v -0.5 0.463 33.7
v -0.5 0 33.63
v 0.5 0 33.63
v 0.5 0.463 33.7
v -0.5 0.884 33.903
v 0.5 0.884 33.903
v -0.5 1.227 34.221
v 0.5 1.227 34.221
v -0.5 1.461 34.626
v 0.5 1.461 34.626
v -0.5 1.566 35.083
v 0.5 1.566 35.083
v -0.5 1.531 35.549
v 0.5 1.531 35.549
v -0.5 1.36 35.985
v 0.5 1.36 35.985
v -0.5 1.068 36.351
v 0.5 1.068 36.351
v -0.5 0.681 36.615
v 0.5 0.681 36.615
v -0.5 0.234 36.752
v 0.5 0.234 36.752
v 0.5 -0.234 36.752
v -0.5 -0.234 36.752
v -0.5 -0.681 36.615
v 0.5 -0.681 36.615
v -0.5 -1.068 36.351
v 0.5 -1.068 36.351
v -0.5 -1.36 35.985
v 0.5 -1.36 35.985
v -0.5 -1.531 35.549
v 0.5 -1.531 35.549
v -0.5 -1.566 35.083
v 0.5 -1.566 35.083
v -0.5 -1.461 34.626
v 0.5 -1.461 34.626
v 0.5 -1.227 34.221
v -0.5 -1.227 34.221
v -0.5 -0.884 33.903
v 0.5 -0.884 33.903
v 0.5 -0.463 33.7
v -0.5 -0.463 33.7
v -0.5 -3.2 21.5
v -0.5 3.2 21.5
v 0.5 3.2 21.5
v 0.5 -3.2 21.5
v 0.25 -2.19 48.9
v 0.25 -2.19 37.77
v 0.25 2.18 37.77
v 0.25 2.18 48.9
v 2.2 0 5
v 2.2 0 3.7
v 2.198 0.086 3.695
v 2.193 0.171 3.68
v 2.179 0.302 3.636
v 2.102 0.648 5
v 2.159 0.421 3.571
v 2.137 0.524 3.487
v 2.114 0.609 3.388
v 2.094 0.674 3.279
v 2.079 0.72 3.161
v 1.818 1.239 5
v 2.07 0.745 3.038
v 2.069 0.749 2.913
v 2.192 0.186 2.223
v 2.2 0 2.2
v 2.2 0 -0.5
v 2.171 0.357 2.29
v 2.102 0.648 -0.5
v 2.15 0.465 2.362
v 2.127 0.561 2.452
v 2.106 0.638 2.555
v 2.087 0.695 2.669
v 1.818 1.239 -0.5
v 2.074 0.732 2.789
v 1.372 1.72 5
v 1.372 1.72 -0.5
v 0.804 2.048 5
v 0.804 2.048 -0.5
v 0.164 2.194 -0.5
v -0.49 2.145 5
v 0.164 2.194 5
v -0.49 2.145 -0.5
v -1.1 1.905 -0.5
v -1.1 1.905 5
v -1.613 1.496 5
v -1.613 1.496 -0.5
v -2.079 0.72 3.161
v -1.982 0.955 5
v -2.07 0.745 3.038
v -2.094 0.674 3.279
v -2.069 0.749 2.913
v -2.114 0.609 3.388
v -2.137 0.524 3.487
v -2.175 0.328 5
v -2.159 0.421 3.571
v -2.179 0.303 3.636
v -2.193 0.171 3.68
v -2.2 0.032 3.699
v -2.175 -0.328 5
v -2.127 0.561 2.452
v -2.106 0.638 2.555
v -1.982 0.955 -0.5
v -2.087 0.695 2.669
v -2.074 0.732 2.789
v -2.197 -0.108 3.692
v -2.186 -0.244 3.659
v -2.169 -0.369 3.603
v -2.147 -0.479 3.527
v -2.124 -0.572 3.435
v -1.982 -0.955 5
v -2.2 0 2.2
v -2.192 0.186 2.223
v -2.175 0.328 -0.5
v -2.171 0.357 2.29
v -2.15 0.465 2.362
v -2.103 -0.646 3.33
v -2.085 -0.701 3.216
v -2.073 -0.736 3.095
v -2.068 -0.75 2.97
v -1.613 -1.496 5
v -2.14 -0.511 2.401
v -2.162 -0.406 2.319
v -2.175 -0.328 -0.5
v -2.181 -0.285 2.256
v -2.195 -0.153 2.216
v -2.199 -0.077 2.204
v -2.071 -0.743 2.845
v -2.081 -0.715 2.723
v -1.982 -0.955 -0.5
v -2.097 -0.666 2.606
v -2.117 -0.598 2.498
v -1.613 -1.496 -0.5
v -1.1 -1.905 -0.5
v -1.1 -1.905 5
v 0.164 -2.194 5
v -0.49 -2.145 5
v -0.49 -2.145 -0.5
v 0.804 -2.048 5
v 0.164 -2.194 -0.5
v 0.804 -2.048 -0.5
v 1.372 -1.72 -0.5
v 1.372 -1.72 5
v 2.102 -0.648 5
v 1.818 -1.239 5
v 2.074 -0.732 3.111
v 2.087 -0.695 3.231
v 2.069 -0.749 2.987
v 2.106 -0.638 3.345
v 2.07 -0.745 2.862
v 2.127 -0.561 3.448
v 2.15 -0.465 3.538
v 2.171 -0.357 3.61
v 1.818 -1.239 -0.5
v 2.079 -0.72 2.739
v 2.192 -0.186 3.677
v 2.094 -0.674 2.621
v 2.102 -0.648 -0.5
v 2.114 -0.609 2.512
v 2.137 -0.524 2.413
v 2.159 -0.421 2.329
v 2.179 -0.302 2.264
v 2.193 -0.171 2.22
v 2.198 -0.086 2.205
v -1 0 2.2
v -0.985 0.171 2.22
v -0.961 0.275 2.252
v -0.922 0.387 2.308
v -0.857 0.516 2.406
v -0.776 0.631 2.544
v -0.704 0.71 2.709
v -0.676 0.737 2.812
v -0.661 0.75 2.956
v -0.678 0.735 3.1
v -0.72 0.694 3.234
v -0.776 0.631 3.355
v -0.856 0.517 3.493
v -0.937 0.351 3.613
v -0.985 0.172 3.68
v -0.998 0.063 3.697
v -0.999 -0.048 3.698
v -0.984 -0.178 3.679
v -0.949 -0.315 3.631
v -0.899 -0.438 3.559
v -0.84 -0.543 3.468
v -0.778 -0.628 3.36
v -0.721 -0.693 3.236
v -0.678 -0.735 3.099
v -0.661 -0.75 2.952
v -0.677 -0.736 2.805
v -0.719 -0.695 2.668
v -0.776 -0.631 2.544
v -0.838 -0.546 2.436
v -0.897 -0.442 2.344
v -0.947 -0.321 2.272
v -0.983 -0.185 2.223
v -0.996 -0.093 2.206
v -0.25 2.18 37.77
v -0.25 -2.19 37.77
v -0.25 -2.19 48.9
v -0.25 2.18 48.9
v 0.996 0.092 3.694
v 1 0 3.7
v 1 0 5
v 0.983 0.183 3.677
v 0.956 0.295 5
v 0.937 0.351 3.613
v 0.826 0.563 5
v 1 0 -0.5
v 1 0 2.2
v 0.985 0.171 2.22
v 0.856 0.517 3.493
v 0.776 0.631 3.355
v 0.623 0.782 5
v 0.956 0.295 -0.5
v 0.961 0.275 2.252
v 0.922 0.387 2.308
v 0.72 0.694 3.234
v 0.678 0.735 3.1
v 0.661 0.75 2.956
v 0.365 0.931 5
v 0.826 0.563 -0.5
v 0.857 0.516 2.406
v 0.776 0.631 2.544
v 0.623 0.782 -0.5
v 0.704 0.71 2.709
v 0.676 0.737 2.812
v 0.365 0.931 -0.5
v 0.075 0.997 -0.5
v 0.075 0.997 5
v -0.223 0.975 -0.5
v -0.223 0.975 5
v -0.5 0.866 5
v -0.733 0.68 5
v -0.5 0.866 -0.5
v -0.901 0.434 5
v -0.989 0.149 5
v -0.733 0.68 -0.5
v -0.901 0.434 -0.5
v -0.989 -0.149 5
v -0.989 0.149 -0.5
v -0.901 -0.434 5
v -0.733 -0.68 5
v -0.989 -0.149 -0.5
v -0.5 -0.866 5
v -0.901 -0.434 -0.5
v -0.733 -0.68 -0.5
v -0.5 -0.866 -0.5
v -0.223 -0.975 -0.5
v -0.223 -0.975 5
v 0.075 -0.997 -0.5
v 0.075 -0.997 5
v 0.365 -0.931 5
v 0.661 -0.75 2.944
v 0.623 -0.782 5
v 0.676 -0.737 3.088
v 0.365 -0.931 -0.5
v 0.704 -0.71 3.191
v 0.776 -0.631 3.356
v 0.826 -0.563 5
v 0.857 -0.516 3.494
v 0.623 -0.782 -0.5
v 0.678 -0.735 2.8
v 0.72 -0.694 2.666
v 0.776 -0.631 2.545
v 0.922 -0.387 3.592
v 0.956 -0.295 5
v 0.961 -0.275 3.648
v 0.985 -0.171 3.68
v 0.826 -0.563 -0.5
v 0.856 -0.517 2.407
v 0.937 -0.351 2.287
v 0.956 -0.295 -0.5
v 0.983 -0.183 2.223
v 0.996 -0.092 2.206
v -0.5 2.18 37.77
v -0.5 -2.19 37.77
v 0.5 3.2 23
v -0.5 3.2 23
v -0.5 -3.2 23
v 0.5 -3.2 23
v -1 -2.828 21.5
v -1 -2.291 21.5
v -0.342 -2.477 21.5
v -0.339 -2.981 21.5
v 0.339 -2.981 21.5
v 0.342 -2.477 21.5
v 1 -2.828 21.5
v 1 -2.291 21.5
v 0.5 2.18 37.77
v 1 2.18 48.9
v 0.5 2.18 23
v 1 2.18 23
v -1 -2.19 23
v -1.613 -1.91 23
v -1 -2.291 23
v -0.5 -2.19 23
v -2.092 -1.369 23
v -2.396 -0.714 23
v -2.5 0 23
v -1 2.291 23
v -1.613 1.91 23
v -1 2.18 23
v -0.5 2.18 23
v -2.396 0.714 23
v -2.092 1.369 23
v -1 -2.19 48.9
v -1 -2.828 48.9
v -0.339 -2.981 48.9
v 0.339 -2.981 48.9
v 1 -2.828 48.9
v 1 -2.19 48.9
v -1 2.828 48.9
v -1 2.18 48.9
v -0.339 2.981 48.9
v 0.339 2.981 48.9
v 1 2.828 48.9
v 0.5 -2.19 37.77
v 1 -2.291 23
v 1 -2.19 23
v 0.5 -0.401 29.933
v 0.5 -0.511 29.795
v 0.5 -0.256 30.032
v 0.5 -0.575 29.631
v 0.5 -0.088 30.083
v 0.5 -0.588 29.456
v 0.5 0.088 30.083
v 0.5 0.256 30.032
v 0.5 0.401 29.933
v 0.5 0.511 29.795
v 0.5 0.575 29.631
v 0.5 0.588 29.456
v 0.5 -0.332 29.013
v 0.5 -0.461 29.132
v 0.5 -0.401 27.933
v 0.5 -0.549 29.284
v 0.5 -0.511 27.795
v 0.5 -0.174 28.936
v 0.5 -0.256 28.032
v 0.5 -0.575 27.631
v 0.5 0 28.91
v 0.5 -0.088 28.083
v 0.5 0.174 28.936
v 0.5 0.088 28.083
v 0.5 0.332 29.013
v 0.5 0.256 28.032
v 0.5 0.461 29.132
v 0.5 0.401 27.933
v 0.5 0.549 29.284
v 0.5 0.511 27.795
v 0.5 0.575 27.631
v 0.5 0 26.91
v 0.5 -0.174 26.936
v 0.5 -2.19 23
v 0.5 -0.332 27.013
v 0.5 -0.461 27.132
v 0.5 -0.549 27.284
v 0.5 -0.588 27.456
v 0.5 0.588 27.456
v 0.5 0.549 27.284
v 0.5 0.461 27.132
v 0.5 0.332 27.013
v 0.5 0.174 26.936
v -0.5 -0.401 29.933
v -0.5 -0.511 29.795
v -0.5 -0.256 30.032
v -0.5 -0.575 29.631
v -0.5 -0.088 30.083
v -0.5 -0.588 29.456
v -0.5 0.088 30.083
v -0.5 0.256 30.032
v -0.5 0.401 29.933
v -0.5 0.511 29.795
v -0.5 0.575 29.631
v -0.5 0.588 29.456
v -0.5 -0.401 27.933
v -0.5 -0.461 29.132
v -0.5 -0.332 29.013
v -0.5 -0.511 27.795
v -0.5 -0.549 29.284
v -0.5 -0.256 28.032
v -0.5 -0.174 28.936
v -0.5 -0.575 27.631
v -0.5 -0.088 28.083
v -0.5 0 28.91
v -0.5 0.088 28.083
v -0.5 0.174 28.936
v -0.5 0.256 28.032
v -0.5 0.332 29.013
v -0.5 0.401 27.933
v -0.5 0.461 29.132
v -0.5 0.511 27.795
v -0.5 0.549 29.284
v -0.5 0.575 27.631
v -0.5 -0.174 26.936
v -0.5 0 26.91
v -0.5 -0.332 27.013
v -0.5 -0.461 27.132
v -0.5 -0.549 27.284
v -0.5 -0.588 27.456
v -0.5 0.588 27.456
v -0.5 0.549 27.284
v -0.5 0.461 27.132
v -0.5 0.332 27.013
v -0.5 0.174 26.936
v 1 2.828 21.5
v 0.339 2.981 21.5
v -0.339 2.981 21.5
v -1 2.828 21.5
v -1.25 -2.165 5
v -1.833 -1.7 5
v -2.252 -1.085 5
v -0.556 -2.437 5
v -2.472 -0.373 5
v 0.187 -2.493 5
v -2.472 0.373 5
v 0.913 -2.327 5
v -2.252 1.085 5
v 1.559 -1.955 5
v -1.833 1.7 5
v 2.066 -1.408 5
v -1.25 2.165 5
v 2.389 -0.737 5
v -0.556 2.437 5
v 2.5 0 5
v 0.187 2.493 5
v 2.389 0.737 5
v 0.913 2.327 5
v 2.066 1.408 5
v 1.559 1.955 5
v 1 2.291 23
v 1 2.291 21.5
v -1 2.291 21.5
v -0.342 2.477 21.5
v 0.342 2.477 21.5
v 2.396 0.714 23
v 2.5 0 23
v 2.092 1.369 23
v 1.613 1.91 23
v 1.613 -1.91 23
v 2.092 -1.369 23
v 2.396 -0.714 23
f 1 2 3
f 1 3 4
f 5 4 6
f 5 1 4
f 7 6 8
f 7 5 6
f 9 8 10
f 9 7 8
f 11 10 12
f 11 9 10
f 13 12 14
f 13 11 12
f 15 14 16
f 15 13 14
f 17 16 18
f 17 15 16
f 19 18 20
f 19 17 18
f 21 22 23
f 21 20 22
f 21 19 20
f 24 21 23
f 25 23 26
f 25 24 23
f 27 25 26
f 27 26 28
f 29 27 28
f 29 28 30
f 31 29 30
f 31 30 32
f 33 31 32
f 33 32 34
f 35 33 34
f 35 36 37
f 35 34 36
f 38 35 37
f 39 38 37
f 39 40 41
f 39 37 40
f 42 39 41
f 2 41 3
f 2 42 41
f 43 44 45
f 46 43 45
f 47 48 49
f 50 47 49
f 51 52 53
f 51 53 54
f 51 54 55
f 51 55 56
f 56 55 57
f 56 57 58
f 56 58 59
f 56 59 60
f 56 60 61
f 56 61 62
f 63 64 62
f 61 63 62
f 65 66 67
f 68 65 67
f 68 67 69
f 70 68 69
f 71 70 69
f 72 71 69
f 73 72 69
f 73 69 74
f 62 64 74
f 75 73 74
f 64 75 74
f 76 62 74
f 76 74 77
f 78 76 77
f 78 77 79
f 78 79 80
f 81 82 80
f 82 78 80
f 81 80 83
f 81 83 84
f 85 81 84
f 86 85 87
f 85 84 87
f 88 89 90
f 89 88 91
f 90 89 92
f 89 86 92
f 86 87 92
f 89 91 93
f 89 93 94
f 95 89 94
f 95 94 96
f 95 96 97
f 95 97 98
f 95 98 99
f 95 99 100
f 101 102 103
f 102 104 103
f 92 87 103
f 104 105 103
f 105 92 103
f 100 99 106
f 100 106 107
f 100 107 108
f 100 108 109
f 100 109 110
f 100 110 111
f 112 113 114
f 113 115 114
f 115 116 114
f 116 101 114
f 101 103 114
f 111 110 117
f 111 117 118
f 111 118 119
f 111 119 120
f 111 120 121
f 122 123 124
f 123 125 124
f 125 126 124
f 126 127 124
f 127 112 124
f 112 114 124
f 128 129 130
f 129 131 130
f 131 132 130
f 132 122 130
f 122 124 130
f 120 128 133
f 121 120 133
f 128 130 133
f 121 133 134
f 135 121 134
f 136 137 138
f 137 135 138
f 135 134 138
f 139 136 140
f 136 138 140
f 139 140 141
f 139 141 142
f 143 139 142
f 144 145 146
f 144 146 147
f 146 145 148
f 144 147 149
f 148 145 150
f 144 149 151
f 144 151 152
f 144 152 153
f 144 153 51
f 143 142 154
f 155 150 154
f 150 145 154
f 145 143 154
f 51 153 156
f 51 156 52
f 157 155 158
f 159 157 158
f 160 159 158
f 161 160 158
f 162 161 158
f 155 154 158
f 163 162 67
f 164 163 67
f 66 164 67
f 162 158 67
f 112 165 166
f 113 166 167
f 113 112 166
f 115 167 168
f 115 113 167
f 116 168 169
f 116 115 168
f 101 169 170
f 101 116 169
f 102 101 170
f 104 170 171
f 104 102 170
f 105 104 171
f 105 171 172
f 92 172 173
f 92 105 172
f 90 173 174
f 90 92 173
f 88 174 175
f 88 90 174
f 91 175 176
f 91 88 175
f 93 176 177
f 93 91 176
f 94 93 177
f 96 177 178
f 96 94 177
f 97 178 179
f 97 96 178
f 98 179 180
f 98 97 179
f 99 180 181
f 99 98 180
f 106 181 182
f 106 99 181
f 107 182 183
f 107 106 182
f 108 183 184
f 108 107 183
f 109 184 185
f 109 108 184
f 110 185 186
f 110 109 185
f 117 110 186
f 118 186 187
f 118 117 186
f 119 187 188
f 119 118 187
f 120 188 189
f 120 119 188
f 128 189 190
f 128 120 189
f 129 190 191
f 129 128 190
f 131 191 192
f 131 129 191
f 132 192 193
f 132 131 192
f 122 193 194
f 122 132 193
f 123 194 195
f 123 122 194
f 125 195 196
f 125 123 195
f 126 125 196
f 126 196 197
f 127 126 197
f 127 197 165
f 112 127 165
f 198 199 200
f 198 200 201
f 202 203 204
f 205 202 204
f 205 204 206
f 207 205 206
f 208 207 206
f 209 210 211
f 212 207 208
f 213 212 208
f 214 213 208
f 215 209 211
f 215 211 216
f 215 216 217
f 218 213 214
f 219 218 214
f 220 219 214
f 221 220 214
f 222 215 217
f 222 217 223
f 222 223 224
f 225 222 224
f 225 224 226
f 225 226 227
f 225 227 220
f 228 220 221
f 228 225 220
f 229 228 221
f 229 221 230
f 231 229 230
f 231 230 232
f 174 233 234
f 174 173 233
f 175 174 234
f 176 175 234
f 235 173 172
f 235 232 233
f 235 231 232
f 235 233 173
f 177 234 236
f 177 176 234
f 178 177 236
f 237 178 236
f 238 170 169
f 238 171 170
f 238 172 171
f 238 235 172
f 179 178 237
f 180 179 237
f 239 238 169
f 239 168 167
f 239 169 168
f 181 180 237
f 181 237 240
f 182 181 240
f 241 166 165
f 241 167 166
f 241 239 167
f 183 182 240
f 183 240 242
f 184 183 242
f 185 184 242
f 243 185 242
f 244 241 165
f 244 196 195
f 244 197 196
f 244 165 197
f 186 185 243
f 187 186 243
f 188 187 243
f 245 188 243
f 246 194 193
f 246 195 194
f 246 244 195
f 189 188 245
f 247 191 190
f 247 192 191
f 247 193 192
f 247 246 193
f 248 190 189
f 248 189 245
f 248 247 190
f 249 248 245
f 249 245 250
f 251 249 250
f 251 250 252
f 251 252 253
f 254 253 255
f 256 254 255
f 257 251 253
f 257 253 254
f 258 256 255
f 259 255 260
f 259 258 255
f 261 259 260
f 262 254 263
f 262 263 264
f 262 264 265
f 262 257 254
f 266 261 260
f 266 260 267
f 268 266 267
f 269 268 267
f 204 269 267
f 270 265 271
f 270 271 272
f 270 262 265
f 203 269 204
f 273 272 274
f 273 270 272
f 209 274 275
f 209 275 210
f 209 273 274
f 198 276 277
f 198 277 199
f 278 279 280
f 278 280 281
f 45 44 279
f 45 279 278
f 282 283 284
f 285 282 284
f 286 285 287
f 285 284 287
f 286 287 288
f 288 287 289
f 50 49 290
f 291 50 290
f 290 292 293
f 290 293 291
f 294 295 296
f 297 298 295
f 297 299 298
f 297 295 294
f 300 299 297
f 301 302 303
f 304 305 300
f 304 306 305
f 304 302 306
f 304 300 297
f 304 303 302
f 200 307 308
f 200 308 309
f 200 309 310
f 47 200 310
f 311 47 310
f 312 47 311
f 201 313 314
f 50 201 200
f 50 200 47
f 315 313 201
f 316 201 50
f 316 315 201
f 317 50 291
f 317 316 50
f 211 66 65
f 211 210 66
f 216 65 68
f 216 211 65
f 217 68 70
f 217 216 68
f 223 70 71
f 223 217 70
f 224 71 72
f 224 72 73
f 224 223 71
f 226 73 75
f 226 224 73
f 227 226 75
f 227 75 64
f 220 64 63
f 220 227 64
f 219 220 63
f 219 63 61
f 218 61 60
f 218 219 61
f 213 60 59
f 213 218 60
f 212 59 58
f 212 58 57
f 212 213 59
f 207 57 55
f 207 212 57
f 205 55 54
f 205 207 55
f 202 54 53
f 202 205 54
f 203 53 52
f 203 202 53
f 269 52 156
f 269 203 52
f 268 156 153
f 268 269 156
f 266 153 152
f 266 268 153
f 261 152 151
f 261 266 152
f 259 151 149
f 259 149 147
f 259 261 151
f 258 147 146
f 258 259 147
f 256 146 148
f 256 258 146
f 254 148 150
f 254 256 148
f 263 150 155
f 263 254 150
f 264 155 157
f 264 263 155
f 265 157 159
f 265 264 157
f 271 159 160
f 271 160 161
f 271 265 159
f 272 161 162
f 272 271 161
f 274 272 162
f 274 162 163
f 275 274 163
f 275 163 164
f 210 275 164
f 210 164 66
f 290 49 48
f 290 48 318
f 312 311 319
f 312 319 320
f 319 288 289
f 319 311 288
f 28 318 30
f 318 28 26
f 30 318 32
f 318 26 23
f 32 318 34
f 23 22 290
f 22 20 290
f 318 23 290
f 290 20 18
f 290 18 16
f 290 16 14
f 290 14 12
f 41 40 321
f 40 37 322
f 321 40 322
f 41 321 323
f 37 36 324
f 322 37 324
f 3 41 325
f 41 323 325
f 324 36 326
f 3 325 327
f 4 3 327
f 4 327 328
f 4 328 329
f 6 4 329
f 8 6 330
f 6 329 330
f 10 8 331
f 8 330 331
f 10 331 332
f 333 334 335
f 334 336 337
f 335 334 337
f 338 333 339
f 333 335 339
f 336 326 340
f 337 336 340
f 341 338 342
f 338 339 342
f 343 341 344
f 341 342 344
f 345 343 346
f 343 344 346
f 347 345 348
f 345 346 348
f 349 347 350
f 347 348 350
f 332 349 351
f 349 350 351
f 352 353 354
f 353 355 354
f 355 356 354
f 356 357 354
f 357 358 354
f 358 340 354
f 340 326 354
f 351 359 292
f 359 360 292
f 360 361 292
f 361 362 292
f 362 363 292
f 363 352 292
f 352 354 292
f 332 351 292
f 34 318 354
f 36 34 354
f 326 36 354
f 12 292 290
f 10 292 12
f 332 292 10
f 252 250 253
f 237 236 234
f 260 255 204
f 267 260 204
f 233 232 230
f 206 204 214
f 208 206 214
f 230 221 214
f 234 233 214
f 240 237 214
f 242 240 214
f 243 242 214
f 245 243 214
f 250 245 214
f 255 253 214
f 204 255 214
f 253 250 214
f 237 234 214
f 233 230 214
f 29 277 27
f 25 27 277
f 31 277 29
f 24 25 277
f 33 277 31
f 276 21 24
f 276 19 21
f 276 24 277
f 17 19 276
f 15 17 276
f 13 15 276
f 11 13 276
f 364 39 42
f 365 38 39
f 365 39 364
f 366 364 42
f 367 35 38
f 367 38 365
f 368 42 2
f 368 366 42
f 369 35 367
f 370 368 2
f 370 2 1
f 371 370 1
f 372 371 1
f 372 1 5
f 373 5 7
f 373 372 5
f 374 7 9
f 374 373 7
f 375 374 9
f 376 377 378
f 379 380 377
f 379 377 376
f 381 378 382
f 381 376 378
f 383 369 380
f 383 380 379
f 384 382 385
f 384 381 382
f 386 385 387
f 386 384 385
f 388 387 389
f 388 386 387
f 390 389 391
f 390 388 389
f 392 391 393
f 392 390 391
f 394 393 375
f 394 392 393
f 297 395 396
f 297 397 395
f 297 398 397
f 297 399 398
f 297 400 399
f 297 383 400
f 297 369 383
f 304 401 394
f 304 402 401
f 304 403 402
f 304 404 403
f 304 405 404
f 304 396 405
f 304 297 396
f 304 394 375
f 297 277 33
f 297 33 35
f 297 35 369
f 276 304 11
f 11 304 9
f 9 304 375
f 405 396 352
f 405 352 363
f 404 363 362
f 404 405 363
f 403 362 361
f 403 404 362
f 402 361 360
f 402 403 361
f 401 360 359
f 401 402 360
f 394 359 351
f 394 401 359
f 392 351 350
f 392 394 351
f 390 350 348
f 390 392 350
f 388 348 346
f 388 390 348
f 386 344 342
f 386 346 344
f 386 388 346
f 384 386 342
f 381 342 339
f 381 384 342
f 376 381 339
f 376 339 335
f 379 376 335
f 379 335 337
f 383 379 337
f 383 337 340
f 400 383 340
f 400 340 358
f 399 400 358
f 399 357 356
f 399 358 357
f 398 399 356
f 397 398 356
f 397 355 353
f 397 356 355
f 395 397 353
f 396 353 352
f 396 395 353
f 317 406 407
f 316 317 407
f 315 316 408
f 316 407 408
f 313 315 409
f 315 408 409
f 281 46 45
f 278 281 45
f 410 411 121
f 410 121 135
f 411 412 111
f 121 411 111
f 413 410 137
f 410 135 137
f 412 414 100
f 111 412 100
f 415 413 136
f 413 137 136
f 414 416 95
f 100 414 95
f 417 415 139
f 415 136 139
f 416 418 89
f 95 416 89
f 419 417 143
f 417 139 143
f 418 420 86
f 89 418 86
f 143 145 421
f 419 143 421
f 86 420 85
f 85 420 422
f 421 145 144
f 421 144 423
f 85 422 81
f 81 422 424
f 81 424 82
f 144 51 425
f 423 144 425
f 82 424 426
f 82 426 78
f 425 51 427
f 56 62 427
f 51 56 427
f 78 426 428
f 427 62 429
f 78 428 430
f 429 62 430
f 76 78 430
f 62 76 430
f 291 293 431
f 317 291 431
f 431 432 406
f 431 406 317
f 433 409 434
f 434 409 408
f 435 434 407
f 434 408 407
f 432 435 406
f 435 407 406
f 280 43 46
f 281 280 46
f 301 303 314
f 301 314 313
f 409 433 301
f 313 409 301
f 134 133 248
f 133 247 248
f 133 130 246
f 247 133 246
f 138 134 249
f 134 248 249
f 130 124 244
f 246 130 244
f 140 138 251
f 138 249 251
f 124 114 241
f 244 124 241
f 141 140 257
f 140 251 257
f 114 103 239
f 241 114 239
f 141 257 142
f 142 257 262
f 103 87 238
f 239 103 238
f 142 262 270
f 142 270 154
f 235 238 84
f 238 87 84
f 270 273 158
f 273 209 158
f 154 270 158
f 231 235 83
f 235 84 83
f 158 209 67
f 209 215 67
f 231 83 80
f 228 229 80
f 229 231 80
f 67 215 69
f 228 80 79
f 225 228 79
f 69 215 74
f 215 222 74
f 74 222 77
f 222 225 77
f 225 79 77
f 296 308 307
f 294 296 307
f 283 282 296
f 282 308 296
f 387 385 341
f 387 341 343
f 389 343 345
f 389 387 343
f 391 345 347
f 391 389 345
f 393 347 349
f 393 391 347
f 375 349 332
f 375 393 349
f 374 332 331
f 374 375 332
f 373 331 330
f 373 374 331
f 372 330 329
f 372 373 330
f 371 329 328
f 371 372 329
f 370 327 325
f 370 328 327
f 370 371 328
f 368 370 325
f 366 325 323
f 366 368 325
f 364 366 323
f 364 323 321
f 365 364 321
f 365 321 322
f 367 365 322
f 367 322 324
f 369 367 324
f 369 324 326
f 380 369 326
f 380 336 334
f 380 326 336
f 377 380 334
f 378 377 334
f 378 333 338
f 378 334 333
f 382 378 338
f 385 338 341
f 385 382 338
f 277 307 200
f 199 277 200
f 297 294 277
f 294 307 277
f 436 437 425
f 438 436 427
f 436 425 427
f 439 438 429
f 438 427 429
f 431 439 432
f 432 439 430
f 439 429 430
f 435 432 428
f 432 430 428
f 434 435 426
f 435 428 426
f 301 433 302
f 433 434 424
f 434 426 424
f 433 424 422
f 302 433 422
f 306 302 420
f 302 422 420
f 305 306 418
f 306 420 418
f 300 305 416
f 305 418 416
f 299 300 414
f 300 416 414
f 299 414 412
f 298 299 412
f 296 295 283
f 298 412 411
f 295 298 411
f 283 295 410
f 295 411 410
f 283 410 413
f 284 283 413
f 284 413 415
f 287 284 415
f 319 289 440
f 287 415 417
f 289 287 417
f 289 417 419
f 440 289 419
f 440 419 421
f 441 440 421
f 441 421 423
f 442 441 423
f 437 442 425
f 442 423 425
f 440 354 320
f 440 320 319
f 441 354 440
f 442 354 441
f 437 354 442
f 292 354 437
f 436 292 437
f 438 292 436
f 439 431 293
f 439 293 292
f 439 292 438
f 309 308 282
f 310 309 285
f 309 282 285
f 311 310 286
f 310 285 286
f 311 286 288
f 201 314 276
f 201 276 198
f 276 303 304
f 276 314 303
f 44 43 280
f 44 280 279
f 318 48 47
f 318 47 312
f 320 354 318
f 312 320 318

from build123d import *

# Parameters (mm, degrees)
BOX002_W          = 1
BOX002_H          = 6.4
BOX002_DEPTH      = 1.5
BOX006_W          = 10
BOX006_H          = 4.37
BOX006_DEPTH      = 12
BOX005_W          = 10
BOX005_H          = 4.37
BOX005_DEPTH      = 12
CYLINDER008_R     = 0.59
CYLINDER008_DEPTH = 50
CYLINDER007_R     = 0.59
CYLINDER007_DEPTH = 50
BOX003_W          = 10
BOX003_H          = 4.37
BOX003_DEPTH      = 26
BOX004_W          = 10
BOX004_H          = 4.37
BOX004_DEPTH      = 26
BOX001_W          = 10
BOX001_H          = 5.5
BOX001_DEPTH      = 27
CYLINDER006_R     = 1.57
CYLINDER006_DEPTH = 20
CYLINDER003_R     = 1.1
CYLINDER003_DEPTH = 2
BOX_W             = 2
BOX_H             = 10
BOX_DEPTH         = 27.9
CYLINDER004_R     = 3
CYLINDER004_DEPTH = 27.4
CYLINDER005_R     = 1
CYLINDER005_DEPTH = 5.5
CYLINDER002_R     = 0.75
CYLINDER002_DEPTH = 6.2
CYLINDER001_R     = 2.5
CYLINDER001_DEPTH = 18
CYLINDER_R        = 2.2
CYLINDER_DEPTH    = 21.5


with BuildPart() as w_rfel002:
    # Box002 → Box002 (new body)
    with BuildSketch(Plane(origin=(-0.5, -3.2, 21.5), x_dir=(1, 0, 0), z_dir=(0, 0, 1))):
        with Locations((0.5, 3.2)):
            Rectangle(BOX002_W, BOX002_H)
    extrude(amount=BOX002_DEPTH)


with BuildPart() as w_rfel006:
    # Box006 → Box006 (new body)
    with BuildSketch(Plane(origin=(-10.25, -2.19, 36.77), x_dir=(1, 0, 0), z_dir=(0, 0, 1))):
        with Locations((5, 2.185)):
            Rectangle(BOX006_W, BOX006_H)
    extrude(amount=BOX006_DEPTH)


with BuildPart() as fusion004:
    # Box005 → Box005 (new body)
    with BuildSketch(Plane(origin=(0.25, -2.19, 36.77), x_dir=(1, 0, 0), z_dir=(0, 0, 1))):
        with Locations((5, 2.185)):
            Rectangle(BOX005_W, BOX005_H)
    extrude(amount=BOX005_DEPTH)

    # Fusion004: union Würfel006
    add(w_rfel006.part)


with BuildPart() as fusion004_1:
    # Fusion004 placement: moved
    add(fusion004.part.moved(Location((0, 0, 1))))


with BuildPart() as m1_6_thread2:
    # Cylinder008 → Cylinder008 (new body)
    with BuildSketch(Plane(origin=(-4, 0, 27.5), x_dir=(0, 0, -1), z_dir=(1, 0, 0))):
        Circle(CYLINDER008_R)
    extrude(amount=CYLINDER008_DEPTH)


with BuildPart() as mirrormountingholes:
    # Cylinder007 → Cylinder007 (new body)
    with BuildSketch(Plane(origin=(-4, 0, 29.5), x_dir=(0, 0, -1), z_dir=(1, 0, 0))):
        Circle(CYLINDER007_R)
    extrude(amount=CYLINDER007_DEPTH)

    # Fusion003: union M1_6__Thread2
    add(m1_6_thread2.part)


with BuildPart() as w_rfel003:
    # Box003 → Box003 (new body)
    with BuildSketch(Plane(origin=(0.5, -2.19, 23), x_dir=(1, 0, 0), z_dir=(0, 0, 1))):
        with Locations((5, 2.185)):
            Rectangle(BOX003_W, BOX003_H)
    extrude(amount=BOX003_DEPTH)


with BuildPart() as mirrorgrooves:
    # Box004 → Box004 (new body)
    with BuildSketch(Plane(origin=(-10.5, -2.19, 23), x_dir=(1, 0, 0), z_dir=(0, 0, 1))):
        with Locations((5, 2.185)):
            Rectangle(BOX004_W, BOX004_H)
    extrude(amount=BOX004_DEPTH)

    # Fusion002: union Würfel003
    add(w_rfel003.part)


with BuildPart() as w_rfel001:
    # Box001 → Box001 (new body)
    with BuildSketch(Plane(origin=(1, -2.57, 21), x_dir=(1, 0, 0), z_dir=(0, 0, 1))):
        with Locations((5, 2.75)):
            Rectangle(BOX001_W, BOX001_H)
    extrude(amount=BOX001_DEPTH)


with BuildPart() as probehole:
    # Cylinder006 → Cylinder006 (new body)
    with BuildSketch(Plane(origin=(-4, 0, 35.2), x_dir=(0, 0, -1), z_dir=(1, 0, 0))):
        Circle(CYLINDER006_R)
    extrude(amount=CYLINDER006_DEPTH)


with BuildPart() as beamhole:
    # Cylinder003 → Cylinder003 (new body)
    with BuildSketch(Plane(origin=(-1, 0, 35.2), x_dir=(0, 0, -1), z_dir=(1, 0, 0))):
        Circle(CYLINDER003_R)
    extrude(amount=CYLINDER003_DEPTH)


with BuildPart() as w_rfel:
    # Box → Box (new body)
    with BuildSketch(Plane(origin=(-1, -5, 21), x_dir=(1, 0, 0), z_dir=(0, 0, 1))):
        with Locations((1, 5)):
            Rectangle(BOX_W, BOX_H)
    extrude(amount=BOX_DEPTH)


with BuildPart() as cut004:
    # Cylinder004 → Cylinder004 (new body)
    with BuildSketch(Plane.XY.offset(21.5)):
        Circle(CYLINDER004_R)
    extrude(amount=CYLINDER004_DEPTH)

    # Common: intersect Würfel
    add(w_rfel.part, mode=Mode.INTERSECT)

    # Cut001: cut BeamHole
    add(beamhole.part, mode=Mode.SUBTRACT)

    # Cut003: cut ProbeHole
    add(probehole.part, mode=Mode.SUBTRACT)

    # Cut004: cut Würfel001
    add(w_rfel001.part, mode=Mode.SUBTRACT)


with BuildPart() as zylinder005:
    # Cylinder005 → Cylinder005 (new body)
    with BuildSketch(Plane.XY.offset(-0.5)):
        Circle(CYLINDER005_R)
    extrude(amount=CYLINDER005_DEPTH)


with BuildPart() as zylinder002:
    # Cylinder002 → Cylinder002 (new body)
    with BuildSketch(Plane(origin=(-3.25, 0, 2.95), x_dir=(0, 0, -1), z_dir=(1, 0, 0))):
        Circle(CYLINDER002_R)
    extrude(amount=CYLINDER002_DEPTH)


with BuildPart() as zylinder001:
    # Cylinder001 → Cylinder001 (new body)
    with BuildSketch(Plane.XY.offset(5)):
        Circle(CYLINDER001_R)
    extrude(amount=CYLINDER001_DEPTH)


with BuildPart() as cut007:
    # Cylinder → Cylinder (new body)
    with BuildSketch(Plane.XY.offset(-0.5)):
        Circle(CYLINDER_R)
    extrude(amount=CYLINDER_DEPTH)

    # Fusion: union Zylinder001
    add(zylinder001.part)

    # Cut: cut Zylinder002
    add(zylinder002.part, mode=Mode.SUBTRACT)

    # Cut002: cut Zylinder005
    add(zylinder005.part, mode=Mode.SUBTRACT)

    # Fusion001: union Cut004
    add(cut004.part)

    # Cut005: cut MirrorGrooves
    add(mirrorgrooves.part, mode=Mode.SUBTRACT)

    # Cut006: cut MirrorMountingHoles
    add(mirrormountingholes.part, mode=Mode.SUBTRACT)

    # Cut007: cut Fusion004
    add(fusion004_1.part, mode=Mode.SUBTRACT)


solid = Compound([w_rfel002.part, cut007.part])
